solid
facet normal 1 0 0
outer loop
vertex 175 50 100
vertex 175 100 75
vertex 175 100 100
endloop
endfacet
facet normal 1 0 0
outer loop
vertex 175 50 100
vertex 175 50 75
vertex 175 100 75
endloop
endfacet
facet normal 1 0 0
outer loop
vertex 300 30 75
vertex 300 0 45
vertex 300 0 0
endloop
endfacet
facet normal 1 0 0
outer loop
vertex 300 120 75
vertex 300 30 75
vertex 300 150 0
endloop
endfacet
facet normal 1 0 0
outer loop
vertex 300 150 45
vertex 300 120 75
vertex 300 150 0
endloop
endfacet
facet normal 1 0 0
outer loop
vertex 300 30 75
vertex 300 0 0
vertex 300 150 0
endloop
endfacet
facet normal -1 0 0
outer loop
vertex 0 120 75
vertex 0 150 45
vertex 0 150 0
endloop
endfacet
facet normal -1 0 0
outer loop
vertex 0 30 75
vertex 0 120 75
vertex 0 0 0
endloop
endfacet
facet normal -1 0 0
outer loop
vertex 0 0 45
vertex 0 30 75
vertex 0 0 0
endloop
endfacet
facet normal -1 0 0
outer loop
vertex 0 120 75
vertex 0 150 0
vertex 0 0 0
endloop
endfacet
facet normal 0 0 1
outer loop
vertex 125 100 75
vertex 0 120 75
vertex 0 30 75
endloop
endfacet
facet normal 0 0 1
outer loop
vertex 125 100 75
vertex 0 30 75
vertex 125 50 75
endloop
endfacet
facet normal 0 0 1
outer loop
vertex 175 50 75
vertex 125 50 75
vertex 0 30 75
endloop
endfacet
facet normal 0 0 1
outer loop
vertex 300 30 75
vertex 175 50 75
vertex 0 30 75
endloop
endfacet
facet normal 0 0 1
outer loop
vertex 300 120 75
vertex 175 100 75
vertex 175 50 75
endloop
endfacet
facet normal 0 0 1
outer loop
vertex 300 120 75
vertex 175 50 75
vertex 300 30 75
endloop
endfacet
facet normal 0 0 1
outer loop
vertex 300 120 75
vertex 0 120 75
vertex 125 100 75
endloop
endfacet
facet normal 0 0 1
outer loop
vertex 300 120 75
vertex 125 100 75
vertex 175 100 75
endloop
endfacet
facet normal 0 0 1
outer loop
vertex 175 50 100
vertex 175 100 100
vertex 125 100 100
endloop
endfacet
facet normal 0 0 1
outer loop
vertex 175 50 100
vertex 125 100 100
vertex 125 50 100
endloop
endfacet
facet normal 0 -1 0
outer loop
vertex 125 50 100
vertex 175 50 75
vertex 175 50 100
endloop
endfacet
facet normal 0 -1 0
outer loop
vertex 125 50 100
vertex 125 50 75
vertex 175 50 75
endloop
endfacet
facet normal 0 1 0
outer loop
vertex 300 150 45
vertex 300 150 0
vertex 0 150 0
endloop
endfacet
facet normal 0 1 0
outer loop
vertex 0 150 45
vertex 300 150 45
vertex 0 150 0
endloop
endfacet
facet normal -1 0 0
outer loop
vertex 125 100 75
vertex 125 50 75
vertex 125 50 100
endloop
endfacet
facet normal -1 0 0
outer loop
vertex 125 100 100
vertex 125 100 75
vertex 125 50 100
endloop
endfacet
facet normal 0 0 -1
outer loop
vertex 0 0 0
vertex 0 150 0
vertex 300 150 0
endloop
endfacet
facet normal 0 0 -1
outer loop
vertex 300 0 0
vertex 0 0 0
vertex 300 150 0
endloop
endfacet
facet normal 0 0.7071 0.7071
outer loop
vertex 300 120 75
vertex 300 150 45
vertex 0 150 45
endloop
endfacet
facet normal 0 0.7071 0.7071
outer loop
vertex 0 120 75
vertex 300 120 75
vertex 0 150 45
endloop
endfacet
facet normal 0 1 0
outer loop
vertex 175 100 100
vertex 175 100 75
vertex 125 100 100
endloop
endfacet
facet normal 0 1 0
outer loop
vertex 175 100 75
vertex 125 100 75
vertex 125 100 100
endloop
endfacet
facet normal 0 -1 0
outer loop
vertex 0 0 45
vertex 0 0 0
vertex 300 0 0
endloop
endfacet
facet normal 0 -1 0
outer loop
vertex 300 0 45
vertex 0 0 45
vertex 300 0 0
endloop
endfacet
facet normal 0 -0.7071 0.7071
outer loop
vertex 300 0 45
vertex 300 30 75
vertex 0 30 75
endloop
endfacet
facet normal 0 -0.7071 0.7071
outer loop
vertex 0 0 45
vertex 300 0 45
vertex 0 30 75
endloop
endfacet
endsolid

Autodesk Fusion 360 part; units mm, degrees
sketch "Esquisse1" plane through (0, 0, 0) normal (0, 0, 1) x (1, 0, 0)
  line L0 (0, 0) -> (300, 0)
  line L1 (300, 0) -> (300, 150)
  line L2 (300, 150) -> (0, 150)
  line L3 (0, 150) -> (0, 0)
extrude "Extrusion1" add sketch "Esquisse1" along normal blind 75
chamfer "Chanfrein1" distance 30 angle 45 1 edges at (150, 0, 75)
chamfer "Chanfrein2" distance 30 angle 45 1 edges at (150, 150, 75)
box "BoitePrimitive1" add length 50 width 50 height 25 placed x (0, -1, 0) y (1, 0, 0) z (0, 0, 1) at (125, 100, 75)
